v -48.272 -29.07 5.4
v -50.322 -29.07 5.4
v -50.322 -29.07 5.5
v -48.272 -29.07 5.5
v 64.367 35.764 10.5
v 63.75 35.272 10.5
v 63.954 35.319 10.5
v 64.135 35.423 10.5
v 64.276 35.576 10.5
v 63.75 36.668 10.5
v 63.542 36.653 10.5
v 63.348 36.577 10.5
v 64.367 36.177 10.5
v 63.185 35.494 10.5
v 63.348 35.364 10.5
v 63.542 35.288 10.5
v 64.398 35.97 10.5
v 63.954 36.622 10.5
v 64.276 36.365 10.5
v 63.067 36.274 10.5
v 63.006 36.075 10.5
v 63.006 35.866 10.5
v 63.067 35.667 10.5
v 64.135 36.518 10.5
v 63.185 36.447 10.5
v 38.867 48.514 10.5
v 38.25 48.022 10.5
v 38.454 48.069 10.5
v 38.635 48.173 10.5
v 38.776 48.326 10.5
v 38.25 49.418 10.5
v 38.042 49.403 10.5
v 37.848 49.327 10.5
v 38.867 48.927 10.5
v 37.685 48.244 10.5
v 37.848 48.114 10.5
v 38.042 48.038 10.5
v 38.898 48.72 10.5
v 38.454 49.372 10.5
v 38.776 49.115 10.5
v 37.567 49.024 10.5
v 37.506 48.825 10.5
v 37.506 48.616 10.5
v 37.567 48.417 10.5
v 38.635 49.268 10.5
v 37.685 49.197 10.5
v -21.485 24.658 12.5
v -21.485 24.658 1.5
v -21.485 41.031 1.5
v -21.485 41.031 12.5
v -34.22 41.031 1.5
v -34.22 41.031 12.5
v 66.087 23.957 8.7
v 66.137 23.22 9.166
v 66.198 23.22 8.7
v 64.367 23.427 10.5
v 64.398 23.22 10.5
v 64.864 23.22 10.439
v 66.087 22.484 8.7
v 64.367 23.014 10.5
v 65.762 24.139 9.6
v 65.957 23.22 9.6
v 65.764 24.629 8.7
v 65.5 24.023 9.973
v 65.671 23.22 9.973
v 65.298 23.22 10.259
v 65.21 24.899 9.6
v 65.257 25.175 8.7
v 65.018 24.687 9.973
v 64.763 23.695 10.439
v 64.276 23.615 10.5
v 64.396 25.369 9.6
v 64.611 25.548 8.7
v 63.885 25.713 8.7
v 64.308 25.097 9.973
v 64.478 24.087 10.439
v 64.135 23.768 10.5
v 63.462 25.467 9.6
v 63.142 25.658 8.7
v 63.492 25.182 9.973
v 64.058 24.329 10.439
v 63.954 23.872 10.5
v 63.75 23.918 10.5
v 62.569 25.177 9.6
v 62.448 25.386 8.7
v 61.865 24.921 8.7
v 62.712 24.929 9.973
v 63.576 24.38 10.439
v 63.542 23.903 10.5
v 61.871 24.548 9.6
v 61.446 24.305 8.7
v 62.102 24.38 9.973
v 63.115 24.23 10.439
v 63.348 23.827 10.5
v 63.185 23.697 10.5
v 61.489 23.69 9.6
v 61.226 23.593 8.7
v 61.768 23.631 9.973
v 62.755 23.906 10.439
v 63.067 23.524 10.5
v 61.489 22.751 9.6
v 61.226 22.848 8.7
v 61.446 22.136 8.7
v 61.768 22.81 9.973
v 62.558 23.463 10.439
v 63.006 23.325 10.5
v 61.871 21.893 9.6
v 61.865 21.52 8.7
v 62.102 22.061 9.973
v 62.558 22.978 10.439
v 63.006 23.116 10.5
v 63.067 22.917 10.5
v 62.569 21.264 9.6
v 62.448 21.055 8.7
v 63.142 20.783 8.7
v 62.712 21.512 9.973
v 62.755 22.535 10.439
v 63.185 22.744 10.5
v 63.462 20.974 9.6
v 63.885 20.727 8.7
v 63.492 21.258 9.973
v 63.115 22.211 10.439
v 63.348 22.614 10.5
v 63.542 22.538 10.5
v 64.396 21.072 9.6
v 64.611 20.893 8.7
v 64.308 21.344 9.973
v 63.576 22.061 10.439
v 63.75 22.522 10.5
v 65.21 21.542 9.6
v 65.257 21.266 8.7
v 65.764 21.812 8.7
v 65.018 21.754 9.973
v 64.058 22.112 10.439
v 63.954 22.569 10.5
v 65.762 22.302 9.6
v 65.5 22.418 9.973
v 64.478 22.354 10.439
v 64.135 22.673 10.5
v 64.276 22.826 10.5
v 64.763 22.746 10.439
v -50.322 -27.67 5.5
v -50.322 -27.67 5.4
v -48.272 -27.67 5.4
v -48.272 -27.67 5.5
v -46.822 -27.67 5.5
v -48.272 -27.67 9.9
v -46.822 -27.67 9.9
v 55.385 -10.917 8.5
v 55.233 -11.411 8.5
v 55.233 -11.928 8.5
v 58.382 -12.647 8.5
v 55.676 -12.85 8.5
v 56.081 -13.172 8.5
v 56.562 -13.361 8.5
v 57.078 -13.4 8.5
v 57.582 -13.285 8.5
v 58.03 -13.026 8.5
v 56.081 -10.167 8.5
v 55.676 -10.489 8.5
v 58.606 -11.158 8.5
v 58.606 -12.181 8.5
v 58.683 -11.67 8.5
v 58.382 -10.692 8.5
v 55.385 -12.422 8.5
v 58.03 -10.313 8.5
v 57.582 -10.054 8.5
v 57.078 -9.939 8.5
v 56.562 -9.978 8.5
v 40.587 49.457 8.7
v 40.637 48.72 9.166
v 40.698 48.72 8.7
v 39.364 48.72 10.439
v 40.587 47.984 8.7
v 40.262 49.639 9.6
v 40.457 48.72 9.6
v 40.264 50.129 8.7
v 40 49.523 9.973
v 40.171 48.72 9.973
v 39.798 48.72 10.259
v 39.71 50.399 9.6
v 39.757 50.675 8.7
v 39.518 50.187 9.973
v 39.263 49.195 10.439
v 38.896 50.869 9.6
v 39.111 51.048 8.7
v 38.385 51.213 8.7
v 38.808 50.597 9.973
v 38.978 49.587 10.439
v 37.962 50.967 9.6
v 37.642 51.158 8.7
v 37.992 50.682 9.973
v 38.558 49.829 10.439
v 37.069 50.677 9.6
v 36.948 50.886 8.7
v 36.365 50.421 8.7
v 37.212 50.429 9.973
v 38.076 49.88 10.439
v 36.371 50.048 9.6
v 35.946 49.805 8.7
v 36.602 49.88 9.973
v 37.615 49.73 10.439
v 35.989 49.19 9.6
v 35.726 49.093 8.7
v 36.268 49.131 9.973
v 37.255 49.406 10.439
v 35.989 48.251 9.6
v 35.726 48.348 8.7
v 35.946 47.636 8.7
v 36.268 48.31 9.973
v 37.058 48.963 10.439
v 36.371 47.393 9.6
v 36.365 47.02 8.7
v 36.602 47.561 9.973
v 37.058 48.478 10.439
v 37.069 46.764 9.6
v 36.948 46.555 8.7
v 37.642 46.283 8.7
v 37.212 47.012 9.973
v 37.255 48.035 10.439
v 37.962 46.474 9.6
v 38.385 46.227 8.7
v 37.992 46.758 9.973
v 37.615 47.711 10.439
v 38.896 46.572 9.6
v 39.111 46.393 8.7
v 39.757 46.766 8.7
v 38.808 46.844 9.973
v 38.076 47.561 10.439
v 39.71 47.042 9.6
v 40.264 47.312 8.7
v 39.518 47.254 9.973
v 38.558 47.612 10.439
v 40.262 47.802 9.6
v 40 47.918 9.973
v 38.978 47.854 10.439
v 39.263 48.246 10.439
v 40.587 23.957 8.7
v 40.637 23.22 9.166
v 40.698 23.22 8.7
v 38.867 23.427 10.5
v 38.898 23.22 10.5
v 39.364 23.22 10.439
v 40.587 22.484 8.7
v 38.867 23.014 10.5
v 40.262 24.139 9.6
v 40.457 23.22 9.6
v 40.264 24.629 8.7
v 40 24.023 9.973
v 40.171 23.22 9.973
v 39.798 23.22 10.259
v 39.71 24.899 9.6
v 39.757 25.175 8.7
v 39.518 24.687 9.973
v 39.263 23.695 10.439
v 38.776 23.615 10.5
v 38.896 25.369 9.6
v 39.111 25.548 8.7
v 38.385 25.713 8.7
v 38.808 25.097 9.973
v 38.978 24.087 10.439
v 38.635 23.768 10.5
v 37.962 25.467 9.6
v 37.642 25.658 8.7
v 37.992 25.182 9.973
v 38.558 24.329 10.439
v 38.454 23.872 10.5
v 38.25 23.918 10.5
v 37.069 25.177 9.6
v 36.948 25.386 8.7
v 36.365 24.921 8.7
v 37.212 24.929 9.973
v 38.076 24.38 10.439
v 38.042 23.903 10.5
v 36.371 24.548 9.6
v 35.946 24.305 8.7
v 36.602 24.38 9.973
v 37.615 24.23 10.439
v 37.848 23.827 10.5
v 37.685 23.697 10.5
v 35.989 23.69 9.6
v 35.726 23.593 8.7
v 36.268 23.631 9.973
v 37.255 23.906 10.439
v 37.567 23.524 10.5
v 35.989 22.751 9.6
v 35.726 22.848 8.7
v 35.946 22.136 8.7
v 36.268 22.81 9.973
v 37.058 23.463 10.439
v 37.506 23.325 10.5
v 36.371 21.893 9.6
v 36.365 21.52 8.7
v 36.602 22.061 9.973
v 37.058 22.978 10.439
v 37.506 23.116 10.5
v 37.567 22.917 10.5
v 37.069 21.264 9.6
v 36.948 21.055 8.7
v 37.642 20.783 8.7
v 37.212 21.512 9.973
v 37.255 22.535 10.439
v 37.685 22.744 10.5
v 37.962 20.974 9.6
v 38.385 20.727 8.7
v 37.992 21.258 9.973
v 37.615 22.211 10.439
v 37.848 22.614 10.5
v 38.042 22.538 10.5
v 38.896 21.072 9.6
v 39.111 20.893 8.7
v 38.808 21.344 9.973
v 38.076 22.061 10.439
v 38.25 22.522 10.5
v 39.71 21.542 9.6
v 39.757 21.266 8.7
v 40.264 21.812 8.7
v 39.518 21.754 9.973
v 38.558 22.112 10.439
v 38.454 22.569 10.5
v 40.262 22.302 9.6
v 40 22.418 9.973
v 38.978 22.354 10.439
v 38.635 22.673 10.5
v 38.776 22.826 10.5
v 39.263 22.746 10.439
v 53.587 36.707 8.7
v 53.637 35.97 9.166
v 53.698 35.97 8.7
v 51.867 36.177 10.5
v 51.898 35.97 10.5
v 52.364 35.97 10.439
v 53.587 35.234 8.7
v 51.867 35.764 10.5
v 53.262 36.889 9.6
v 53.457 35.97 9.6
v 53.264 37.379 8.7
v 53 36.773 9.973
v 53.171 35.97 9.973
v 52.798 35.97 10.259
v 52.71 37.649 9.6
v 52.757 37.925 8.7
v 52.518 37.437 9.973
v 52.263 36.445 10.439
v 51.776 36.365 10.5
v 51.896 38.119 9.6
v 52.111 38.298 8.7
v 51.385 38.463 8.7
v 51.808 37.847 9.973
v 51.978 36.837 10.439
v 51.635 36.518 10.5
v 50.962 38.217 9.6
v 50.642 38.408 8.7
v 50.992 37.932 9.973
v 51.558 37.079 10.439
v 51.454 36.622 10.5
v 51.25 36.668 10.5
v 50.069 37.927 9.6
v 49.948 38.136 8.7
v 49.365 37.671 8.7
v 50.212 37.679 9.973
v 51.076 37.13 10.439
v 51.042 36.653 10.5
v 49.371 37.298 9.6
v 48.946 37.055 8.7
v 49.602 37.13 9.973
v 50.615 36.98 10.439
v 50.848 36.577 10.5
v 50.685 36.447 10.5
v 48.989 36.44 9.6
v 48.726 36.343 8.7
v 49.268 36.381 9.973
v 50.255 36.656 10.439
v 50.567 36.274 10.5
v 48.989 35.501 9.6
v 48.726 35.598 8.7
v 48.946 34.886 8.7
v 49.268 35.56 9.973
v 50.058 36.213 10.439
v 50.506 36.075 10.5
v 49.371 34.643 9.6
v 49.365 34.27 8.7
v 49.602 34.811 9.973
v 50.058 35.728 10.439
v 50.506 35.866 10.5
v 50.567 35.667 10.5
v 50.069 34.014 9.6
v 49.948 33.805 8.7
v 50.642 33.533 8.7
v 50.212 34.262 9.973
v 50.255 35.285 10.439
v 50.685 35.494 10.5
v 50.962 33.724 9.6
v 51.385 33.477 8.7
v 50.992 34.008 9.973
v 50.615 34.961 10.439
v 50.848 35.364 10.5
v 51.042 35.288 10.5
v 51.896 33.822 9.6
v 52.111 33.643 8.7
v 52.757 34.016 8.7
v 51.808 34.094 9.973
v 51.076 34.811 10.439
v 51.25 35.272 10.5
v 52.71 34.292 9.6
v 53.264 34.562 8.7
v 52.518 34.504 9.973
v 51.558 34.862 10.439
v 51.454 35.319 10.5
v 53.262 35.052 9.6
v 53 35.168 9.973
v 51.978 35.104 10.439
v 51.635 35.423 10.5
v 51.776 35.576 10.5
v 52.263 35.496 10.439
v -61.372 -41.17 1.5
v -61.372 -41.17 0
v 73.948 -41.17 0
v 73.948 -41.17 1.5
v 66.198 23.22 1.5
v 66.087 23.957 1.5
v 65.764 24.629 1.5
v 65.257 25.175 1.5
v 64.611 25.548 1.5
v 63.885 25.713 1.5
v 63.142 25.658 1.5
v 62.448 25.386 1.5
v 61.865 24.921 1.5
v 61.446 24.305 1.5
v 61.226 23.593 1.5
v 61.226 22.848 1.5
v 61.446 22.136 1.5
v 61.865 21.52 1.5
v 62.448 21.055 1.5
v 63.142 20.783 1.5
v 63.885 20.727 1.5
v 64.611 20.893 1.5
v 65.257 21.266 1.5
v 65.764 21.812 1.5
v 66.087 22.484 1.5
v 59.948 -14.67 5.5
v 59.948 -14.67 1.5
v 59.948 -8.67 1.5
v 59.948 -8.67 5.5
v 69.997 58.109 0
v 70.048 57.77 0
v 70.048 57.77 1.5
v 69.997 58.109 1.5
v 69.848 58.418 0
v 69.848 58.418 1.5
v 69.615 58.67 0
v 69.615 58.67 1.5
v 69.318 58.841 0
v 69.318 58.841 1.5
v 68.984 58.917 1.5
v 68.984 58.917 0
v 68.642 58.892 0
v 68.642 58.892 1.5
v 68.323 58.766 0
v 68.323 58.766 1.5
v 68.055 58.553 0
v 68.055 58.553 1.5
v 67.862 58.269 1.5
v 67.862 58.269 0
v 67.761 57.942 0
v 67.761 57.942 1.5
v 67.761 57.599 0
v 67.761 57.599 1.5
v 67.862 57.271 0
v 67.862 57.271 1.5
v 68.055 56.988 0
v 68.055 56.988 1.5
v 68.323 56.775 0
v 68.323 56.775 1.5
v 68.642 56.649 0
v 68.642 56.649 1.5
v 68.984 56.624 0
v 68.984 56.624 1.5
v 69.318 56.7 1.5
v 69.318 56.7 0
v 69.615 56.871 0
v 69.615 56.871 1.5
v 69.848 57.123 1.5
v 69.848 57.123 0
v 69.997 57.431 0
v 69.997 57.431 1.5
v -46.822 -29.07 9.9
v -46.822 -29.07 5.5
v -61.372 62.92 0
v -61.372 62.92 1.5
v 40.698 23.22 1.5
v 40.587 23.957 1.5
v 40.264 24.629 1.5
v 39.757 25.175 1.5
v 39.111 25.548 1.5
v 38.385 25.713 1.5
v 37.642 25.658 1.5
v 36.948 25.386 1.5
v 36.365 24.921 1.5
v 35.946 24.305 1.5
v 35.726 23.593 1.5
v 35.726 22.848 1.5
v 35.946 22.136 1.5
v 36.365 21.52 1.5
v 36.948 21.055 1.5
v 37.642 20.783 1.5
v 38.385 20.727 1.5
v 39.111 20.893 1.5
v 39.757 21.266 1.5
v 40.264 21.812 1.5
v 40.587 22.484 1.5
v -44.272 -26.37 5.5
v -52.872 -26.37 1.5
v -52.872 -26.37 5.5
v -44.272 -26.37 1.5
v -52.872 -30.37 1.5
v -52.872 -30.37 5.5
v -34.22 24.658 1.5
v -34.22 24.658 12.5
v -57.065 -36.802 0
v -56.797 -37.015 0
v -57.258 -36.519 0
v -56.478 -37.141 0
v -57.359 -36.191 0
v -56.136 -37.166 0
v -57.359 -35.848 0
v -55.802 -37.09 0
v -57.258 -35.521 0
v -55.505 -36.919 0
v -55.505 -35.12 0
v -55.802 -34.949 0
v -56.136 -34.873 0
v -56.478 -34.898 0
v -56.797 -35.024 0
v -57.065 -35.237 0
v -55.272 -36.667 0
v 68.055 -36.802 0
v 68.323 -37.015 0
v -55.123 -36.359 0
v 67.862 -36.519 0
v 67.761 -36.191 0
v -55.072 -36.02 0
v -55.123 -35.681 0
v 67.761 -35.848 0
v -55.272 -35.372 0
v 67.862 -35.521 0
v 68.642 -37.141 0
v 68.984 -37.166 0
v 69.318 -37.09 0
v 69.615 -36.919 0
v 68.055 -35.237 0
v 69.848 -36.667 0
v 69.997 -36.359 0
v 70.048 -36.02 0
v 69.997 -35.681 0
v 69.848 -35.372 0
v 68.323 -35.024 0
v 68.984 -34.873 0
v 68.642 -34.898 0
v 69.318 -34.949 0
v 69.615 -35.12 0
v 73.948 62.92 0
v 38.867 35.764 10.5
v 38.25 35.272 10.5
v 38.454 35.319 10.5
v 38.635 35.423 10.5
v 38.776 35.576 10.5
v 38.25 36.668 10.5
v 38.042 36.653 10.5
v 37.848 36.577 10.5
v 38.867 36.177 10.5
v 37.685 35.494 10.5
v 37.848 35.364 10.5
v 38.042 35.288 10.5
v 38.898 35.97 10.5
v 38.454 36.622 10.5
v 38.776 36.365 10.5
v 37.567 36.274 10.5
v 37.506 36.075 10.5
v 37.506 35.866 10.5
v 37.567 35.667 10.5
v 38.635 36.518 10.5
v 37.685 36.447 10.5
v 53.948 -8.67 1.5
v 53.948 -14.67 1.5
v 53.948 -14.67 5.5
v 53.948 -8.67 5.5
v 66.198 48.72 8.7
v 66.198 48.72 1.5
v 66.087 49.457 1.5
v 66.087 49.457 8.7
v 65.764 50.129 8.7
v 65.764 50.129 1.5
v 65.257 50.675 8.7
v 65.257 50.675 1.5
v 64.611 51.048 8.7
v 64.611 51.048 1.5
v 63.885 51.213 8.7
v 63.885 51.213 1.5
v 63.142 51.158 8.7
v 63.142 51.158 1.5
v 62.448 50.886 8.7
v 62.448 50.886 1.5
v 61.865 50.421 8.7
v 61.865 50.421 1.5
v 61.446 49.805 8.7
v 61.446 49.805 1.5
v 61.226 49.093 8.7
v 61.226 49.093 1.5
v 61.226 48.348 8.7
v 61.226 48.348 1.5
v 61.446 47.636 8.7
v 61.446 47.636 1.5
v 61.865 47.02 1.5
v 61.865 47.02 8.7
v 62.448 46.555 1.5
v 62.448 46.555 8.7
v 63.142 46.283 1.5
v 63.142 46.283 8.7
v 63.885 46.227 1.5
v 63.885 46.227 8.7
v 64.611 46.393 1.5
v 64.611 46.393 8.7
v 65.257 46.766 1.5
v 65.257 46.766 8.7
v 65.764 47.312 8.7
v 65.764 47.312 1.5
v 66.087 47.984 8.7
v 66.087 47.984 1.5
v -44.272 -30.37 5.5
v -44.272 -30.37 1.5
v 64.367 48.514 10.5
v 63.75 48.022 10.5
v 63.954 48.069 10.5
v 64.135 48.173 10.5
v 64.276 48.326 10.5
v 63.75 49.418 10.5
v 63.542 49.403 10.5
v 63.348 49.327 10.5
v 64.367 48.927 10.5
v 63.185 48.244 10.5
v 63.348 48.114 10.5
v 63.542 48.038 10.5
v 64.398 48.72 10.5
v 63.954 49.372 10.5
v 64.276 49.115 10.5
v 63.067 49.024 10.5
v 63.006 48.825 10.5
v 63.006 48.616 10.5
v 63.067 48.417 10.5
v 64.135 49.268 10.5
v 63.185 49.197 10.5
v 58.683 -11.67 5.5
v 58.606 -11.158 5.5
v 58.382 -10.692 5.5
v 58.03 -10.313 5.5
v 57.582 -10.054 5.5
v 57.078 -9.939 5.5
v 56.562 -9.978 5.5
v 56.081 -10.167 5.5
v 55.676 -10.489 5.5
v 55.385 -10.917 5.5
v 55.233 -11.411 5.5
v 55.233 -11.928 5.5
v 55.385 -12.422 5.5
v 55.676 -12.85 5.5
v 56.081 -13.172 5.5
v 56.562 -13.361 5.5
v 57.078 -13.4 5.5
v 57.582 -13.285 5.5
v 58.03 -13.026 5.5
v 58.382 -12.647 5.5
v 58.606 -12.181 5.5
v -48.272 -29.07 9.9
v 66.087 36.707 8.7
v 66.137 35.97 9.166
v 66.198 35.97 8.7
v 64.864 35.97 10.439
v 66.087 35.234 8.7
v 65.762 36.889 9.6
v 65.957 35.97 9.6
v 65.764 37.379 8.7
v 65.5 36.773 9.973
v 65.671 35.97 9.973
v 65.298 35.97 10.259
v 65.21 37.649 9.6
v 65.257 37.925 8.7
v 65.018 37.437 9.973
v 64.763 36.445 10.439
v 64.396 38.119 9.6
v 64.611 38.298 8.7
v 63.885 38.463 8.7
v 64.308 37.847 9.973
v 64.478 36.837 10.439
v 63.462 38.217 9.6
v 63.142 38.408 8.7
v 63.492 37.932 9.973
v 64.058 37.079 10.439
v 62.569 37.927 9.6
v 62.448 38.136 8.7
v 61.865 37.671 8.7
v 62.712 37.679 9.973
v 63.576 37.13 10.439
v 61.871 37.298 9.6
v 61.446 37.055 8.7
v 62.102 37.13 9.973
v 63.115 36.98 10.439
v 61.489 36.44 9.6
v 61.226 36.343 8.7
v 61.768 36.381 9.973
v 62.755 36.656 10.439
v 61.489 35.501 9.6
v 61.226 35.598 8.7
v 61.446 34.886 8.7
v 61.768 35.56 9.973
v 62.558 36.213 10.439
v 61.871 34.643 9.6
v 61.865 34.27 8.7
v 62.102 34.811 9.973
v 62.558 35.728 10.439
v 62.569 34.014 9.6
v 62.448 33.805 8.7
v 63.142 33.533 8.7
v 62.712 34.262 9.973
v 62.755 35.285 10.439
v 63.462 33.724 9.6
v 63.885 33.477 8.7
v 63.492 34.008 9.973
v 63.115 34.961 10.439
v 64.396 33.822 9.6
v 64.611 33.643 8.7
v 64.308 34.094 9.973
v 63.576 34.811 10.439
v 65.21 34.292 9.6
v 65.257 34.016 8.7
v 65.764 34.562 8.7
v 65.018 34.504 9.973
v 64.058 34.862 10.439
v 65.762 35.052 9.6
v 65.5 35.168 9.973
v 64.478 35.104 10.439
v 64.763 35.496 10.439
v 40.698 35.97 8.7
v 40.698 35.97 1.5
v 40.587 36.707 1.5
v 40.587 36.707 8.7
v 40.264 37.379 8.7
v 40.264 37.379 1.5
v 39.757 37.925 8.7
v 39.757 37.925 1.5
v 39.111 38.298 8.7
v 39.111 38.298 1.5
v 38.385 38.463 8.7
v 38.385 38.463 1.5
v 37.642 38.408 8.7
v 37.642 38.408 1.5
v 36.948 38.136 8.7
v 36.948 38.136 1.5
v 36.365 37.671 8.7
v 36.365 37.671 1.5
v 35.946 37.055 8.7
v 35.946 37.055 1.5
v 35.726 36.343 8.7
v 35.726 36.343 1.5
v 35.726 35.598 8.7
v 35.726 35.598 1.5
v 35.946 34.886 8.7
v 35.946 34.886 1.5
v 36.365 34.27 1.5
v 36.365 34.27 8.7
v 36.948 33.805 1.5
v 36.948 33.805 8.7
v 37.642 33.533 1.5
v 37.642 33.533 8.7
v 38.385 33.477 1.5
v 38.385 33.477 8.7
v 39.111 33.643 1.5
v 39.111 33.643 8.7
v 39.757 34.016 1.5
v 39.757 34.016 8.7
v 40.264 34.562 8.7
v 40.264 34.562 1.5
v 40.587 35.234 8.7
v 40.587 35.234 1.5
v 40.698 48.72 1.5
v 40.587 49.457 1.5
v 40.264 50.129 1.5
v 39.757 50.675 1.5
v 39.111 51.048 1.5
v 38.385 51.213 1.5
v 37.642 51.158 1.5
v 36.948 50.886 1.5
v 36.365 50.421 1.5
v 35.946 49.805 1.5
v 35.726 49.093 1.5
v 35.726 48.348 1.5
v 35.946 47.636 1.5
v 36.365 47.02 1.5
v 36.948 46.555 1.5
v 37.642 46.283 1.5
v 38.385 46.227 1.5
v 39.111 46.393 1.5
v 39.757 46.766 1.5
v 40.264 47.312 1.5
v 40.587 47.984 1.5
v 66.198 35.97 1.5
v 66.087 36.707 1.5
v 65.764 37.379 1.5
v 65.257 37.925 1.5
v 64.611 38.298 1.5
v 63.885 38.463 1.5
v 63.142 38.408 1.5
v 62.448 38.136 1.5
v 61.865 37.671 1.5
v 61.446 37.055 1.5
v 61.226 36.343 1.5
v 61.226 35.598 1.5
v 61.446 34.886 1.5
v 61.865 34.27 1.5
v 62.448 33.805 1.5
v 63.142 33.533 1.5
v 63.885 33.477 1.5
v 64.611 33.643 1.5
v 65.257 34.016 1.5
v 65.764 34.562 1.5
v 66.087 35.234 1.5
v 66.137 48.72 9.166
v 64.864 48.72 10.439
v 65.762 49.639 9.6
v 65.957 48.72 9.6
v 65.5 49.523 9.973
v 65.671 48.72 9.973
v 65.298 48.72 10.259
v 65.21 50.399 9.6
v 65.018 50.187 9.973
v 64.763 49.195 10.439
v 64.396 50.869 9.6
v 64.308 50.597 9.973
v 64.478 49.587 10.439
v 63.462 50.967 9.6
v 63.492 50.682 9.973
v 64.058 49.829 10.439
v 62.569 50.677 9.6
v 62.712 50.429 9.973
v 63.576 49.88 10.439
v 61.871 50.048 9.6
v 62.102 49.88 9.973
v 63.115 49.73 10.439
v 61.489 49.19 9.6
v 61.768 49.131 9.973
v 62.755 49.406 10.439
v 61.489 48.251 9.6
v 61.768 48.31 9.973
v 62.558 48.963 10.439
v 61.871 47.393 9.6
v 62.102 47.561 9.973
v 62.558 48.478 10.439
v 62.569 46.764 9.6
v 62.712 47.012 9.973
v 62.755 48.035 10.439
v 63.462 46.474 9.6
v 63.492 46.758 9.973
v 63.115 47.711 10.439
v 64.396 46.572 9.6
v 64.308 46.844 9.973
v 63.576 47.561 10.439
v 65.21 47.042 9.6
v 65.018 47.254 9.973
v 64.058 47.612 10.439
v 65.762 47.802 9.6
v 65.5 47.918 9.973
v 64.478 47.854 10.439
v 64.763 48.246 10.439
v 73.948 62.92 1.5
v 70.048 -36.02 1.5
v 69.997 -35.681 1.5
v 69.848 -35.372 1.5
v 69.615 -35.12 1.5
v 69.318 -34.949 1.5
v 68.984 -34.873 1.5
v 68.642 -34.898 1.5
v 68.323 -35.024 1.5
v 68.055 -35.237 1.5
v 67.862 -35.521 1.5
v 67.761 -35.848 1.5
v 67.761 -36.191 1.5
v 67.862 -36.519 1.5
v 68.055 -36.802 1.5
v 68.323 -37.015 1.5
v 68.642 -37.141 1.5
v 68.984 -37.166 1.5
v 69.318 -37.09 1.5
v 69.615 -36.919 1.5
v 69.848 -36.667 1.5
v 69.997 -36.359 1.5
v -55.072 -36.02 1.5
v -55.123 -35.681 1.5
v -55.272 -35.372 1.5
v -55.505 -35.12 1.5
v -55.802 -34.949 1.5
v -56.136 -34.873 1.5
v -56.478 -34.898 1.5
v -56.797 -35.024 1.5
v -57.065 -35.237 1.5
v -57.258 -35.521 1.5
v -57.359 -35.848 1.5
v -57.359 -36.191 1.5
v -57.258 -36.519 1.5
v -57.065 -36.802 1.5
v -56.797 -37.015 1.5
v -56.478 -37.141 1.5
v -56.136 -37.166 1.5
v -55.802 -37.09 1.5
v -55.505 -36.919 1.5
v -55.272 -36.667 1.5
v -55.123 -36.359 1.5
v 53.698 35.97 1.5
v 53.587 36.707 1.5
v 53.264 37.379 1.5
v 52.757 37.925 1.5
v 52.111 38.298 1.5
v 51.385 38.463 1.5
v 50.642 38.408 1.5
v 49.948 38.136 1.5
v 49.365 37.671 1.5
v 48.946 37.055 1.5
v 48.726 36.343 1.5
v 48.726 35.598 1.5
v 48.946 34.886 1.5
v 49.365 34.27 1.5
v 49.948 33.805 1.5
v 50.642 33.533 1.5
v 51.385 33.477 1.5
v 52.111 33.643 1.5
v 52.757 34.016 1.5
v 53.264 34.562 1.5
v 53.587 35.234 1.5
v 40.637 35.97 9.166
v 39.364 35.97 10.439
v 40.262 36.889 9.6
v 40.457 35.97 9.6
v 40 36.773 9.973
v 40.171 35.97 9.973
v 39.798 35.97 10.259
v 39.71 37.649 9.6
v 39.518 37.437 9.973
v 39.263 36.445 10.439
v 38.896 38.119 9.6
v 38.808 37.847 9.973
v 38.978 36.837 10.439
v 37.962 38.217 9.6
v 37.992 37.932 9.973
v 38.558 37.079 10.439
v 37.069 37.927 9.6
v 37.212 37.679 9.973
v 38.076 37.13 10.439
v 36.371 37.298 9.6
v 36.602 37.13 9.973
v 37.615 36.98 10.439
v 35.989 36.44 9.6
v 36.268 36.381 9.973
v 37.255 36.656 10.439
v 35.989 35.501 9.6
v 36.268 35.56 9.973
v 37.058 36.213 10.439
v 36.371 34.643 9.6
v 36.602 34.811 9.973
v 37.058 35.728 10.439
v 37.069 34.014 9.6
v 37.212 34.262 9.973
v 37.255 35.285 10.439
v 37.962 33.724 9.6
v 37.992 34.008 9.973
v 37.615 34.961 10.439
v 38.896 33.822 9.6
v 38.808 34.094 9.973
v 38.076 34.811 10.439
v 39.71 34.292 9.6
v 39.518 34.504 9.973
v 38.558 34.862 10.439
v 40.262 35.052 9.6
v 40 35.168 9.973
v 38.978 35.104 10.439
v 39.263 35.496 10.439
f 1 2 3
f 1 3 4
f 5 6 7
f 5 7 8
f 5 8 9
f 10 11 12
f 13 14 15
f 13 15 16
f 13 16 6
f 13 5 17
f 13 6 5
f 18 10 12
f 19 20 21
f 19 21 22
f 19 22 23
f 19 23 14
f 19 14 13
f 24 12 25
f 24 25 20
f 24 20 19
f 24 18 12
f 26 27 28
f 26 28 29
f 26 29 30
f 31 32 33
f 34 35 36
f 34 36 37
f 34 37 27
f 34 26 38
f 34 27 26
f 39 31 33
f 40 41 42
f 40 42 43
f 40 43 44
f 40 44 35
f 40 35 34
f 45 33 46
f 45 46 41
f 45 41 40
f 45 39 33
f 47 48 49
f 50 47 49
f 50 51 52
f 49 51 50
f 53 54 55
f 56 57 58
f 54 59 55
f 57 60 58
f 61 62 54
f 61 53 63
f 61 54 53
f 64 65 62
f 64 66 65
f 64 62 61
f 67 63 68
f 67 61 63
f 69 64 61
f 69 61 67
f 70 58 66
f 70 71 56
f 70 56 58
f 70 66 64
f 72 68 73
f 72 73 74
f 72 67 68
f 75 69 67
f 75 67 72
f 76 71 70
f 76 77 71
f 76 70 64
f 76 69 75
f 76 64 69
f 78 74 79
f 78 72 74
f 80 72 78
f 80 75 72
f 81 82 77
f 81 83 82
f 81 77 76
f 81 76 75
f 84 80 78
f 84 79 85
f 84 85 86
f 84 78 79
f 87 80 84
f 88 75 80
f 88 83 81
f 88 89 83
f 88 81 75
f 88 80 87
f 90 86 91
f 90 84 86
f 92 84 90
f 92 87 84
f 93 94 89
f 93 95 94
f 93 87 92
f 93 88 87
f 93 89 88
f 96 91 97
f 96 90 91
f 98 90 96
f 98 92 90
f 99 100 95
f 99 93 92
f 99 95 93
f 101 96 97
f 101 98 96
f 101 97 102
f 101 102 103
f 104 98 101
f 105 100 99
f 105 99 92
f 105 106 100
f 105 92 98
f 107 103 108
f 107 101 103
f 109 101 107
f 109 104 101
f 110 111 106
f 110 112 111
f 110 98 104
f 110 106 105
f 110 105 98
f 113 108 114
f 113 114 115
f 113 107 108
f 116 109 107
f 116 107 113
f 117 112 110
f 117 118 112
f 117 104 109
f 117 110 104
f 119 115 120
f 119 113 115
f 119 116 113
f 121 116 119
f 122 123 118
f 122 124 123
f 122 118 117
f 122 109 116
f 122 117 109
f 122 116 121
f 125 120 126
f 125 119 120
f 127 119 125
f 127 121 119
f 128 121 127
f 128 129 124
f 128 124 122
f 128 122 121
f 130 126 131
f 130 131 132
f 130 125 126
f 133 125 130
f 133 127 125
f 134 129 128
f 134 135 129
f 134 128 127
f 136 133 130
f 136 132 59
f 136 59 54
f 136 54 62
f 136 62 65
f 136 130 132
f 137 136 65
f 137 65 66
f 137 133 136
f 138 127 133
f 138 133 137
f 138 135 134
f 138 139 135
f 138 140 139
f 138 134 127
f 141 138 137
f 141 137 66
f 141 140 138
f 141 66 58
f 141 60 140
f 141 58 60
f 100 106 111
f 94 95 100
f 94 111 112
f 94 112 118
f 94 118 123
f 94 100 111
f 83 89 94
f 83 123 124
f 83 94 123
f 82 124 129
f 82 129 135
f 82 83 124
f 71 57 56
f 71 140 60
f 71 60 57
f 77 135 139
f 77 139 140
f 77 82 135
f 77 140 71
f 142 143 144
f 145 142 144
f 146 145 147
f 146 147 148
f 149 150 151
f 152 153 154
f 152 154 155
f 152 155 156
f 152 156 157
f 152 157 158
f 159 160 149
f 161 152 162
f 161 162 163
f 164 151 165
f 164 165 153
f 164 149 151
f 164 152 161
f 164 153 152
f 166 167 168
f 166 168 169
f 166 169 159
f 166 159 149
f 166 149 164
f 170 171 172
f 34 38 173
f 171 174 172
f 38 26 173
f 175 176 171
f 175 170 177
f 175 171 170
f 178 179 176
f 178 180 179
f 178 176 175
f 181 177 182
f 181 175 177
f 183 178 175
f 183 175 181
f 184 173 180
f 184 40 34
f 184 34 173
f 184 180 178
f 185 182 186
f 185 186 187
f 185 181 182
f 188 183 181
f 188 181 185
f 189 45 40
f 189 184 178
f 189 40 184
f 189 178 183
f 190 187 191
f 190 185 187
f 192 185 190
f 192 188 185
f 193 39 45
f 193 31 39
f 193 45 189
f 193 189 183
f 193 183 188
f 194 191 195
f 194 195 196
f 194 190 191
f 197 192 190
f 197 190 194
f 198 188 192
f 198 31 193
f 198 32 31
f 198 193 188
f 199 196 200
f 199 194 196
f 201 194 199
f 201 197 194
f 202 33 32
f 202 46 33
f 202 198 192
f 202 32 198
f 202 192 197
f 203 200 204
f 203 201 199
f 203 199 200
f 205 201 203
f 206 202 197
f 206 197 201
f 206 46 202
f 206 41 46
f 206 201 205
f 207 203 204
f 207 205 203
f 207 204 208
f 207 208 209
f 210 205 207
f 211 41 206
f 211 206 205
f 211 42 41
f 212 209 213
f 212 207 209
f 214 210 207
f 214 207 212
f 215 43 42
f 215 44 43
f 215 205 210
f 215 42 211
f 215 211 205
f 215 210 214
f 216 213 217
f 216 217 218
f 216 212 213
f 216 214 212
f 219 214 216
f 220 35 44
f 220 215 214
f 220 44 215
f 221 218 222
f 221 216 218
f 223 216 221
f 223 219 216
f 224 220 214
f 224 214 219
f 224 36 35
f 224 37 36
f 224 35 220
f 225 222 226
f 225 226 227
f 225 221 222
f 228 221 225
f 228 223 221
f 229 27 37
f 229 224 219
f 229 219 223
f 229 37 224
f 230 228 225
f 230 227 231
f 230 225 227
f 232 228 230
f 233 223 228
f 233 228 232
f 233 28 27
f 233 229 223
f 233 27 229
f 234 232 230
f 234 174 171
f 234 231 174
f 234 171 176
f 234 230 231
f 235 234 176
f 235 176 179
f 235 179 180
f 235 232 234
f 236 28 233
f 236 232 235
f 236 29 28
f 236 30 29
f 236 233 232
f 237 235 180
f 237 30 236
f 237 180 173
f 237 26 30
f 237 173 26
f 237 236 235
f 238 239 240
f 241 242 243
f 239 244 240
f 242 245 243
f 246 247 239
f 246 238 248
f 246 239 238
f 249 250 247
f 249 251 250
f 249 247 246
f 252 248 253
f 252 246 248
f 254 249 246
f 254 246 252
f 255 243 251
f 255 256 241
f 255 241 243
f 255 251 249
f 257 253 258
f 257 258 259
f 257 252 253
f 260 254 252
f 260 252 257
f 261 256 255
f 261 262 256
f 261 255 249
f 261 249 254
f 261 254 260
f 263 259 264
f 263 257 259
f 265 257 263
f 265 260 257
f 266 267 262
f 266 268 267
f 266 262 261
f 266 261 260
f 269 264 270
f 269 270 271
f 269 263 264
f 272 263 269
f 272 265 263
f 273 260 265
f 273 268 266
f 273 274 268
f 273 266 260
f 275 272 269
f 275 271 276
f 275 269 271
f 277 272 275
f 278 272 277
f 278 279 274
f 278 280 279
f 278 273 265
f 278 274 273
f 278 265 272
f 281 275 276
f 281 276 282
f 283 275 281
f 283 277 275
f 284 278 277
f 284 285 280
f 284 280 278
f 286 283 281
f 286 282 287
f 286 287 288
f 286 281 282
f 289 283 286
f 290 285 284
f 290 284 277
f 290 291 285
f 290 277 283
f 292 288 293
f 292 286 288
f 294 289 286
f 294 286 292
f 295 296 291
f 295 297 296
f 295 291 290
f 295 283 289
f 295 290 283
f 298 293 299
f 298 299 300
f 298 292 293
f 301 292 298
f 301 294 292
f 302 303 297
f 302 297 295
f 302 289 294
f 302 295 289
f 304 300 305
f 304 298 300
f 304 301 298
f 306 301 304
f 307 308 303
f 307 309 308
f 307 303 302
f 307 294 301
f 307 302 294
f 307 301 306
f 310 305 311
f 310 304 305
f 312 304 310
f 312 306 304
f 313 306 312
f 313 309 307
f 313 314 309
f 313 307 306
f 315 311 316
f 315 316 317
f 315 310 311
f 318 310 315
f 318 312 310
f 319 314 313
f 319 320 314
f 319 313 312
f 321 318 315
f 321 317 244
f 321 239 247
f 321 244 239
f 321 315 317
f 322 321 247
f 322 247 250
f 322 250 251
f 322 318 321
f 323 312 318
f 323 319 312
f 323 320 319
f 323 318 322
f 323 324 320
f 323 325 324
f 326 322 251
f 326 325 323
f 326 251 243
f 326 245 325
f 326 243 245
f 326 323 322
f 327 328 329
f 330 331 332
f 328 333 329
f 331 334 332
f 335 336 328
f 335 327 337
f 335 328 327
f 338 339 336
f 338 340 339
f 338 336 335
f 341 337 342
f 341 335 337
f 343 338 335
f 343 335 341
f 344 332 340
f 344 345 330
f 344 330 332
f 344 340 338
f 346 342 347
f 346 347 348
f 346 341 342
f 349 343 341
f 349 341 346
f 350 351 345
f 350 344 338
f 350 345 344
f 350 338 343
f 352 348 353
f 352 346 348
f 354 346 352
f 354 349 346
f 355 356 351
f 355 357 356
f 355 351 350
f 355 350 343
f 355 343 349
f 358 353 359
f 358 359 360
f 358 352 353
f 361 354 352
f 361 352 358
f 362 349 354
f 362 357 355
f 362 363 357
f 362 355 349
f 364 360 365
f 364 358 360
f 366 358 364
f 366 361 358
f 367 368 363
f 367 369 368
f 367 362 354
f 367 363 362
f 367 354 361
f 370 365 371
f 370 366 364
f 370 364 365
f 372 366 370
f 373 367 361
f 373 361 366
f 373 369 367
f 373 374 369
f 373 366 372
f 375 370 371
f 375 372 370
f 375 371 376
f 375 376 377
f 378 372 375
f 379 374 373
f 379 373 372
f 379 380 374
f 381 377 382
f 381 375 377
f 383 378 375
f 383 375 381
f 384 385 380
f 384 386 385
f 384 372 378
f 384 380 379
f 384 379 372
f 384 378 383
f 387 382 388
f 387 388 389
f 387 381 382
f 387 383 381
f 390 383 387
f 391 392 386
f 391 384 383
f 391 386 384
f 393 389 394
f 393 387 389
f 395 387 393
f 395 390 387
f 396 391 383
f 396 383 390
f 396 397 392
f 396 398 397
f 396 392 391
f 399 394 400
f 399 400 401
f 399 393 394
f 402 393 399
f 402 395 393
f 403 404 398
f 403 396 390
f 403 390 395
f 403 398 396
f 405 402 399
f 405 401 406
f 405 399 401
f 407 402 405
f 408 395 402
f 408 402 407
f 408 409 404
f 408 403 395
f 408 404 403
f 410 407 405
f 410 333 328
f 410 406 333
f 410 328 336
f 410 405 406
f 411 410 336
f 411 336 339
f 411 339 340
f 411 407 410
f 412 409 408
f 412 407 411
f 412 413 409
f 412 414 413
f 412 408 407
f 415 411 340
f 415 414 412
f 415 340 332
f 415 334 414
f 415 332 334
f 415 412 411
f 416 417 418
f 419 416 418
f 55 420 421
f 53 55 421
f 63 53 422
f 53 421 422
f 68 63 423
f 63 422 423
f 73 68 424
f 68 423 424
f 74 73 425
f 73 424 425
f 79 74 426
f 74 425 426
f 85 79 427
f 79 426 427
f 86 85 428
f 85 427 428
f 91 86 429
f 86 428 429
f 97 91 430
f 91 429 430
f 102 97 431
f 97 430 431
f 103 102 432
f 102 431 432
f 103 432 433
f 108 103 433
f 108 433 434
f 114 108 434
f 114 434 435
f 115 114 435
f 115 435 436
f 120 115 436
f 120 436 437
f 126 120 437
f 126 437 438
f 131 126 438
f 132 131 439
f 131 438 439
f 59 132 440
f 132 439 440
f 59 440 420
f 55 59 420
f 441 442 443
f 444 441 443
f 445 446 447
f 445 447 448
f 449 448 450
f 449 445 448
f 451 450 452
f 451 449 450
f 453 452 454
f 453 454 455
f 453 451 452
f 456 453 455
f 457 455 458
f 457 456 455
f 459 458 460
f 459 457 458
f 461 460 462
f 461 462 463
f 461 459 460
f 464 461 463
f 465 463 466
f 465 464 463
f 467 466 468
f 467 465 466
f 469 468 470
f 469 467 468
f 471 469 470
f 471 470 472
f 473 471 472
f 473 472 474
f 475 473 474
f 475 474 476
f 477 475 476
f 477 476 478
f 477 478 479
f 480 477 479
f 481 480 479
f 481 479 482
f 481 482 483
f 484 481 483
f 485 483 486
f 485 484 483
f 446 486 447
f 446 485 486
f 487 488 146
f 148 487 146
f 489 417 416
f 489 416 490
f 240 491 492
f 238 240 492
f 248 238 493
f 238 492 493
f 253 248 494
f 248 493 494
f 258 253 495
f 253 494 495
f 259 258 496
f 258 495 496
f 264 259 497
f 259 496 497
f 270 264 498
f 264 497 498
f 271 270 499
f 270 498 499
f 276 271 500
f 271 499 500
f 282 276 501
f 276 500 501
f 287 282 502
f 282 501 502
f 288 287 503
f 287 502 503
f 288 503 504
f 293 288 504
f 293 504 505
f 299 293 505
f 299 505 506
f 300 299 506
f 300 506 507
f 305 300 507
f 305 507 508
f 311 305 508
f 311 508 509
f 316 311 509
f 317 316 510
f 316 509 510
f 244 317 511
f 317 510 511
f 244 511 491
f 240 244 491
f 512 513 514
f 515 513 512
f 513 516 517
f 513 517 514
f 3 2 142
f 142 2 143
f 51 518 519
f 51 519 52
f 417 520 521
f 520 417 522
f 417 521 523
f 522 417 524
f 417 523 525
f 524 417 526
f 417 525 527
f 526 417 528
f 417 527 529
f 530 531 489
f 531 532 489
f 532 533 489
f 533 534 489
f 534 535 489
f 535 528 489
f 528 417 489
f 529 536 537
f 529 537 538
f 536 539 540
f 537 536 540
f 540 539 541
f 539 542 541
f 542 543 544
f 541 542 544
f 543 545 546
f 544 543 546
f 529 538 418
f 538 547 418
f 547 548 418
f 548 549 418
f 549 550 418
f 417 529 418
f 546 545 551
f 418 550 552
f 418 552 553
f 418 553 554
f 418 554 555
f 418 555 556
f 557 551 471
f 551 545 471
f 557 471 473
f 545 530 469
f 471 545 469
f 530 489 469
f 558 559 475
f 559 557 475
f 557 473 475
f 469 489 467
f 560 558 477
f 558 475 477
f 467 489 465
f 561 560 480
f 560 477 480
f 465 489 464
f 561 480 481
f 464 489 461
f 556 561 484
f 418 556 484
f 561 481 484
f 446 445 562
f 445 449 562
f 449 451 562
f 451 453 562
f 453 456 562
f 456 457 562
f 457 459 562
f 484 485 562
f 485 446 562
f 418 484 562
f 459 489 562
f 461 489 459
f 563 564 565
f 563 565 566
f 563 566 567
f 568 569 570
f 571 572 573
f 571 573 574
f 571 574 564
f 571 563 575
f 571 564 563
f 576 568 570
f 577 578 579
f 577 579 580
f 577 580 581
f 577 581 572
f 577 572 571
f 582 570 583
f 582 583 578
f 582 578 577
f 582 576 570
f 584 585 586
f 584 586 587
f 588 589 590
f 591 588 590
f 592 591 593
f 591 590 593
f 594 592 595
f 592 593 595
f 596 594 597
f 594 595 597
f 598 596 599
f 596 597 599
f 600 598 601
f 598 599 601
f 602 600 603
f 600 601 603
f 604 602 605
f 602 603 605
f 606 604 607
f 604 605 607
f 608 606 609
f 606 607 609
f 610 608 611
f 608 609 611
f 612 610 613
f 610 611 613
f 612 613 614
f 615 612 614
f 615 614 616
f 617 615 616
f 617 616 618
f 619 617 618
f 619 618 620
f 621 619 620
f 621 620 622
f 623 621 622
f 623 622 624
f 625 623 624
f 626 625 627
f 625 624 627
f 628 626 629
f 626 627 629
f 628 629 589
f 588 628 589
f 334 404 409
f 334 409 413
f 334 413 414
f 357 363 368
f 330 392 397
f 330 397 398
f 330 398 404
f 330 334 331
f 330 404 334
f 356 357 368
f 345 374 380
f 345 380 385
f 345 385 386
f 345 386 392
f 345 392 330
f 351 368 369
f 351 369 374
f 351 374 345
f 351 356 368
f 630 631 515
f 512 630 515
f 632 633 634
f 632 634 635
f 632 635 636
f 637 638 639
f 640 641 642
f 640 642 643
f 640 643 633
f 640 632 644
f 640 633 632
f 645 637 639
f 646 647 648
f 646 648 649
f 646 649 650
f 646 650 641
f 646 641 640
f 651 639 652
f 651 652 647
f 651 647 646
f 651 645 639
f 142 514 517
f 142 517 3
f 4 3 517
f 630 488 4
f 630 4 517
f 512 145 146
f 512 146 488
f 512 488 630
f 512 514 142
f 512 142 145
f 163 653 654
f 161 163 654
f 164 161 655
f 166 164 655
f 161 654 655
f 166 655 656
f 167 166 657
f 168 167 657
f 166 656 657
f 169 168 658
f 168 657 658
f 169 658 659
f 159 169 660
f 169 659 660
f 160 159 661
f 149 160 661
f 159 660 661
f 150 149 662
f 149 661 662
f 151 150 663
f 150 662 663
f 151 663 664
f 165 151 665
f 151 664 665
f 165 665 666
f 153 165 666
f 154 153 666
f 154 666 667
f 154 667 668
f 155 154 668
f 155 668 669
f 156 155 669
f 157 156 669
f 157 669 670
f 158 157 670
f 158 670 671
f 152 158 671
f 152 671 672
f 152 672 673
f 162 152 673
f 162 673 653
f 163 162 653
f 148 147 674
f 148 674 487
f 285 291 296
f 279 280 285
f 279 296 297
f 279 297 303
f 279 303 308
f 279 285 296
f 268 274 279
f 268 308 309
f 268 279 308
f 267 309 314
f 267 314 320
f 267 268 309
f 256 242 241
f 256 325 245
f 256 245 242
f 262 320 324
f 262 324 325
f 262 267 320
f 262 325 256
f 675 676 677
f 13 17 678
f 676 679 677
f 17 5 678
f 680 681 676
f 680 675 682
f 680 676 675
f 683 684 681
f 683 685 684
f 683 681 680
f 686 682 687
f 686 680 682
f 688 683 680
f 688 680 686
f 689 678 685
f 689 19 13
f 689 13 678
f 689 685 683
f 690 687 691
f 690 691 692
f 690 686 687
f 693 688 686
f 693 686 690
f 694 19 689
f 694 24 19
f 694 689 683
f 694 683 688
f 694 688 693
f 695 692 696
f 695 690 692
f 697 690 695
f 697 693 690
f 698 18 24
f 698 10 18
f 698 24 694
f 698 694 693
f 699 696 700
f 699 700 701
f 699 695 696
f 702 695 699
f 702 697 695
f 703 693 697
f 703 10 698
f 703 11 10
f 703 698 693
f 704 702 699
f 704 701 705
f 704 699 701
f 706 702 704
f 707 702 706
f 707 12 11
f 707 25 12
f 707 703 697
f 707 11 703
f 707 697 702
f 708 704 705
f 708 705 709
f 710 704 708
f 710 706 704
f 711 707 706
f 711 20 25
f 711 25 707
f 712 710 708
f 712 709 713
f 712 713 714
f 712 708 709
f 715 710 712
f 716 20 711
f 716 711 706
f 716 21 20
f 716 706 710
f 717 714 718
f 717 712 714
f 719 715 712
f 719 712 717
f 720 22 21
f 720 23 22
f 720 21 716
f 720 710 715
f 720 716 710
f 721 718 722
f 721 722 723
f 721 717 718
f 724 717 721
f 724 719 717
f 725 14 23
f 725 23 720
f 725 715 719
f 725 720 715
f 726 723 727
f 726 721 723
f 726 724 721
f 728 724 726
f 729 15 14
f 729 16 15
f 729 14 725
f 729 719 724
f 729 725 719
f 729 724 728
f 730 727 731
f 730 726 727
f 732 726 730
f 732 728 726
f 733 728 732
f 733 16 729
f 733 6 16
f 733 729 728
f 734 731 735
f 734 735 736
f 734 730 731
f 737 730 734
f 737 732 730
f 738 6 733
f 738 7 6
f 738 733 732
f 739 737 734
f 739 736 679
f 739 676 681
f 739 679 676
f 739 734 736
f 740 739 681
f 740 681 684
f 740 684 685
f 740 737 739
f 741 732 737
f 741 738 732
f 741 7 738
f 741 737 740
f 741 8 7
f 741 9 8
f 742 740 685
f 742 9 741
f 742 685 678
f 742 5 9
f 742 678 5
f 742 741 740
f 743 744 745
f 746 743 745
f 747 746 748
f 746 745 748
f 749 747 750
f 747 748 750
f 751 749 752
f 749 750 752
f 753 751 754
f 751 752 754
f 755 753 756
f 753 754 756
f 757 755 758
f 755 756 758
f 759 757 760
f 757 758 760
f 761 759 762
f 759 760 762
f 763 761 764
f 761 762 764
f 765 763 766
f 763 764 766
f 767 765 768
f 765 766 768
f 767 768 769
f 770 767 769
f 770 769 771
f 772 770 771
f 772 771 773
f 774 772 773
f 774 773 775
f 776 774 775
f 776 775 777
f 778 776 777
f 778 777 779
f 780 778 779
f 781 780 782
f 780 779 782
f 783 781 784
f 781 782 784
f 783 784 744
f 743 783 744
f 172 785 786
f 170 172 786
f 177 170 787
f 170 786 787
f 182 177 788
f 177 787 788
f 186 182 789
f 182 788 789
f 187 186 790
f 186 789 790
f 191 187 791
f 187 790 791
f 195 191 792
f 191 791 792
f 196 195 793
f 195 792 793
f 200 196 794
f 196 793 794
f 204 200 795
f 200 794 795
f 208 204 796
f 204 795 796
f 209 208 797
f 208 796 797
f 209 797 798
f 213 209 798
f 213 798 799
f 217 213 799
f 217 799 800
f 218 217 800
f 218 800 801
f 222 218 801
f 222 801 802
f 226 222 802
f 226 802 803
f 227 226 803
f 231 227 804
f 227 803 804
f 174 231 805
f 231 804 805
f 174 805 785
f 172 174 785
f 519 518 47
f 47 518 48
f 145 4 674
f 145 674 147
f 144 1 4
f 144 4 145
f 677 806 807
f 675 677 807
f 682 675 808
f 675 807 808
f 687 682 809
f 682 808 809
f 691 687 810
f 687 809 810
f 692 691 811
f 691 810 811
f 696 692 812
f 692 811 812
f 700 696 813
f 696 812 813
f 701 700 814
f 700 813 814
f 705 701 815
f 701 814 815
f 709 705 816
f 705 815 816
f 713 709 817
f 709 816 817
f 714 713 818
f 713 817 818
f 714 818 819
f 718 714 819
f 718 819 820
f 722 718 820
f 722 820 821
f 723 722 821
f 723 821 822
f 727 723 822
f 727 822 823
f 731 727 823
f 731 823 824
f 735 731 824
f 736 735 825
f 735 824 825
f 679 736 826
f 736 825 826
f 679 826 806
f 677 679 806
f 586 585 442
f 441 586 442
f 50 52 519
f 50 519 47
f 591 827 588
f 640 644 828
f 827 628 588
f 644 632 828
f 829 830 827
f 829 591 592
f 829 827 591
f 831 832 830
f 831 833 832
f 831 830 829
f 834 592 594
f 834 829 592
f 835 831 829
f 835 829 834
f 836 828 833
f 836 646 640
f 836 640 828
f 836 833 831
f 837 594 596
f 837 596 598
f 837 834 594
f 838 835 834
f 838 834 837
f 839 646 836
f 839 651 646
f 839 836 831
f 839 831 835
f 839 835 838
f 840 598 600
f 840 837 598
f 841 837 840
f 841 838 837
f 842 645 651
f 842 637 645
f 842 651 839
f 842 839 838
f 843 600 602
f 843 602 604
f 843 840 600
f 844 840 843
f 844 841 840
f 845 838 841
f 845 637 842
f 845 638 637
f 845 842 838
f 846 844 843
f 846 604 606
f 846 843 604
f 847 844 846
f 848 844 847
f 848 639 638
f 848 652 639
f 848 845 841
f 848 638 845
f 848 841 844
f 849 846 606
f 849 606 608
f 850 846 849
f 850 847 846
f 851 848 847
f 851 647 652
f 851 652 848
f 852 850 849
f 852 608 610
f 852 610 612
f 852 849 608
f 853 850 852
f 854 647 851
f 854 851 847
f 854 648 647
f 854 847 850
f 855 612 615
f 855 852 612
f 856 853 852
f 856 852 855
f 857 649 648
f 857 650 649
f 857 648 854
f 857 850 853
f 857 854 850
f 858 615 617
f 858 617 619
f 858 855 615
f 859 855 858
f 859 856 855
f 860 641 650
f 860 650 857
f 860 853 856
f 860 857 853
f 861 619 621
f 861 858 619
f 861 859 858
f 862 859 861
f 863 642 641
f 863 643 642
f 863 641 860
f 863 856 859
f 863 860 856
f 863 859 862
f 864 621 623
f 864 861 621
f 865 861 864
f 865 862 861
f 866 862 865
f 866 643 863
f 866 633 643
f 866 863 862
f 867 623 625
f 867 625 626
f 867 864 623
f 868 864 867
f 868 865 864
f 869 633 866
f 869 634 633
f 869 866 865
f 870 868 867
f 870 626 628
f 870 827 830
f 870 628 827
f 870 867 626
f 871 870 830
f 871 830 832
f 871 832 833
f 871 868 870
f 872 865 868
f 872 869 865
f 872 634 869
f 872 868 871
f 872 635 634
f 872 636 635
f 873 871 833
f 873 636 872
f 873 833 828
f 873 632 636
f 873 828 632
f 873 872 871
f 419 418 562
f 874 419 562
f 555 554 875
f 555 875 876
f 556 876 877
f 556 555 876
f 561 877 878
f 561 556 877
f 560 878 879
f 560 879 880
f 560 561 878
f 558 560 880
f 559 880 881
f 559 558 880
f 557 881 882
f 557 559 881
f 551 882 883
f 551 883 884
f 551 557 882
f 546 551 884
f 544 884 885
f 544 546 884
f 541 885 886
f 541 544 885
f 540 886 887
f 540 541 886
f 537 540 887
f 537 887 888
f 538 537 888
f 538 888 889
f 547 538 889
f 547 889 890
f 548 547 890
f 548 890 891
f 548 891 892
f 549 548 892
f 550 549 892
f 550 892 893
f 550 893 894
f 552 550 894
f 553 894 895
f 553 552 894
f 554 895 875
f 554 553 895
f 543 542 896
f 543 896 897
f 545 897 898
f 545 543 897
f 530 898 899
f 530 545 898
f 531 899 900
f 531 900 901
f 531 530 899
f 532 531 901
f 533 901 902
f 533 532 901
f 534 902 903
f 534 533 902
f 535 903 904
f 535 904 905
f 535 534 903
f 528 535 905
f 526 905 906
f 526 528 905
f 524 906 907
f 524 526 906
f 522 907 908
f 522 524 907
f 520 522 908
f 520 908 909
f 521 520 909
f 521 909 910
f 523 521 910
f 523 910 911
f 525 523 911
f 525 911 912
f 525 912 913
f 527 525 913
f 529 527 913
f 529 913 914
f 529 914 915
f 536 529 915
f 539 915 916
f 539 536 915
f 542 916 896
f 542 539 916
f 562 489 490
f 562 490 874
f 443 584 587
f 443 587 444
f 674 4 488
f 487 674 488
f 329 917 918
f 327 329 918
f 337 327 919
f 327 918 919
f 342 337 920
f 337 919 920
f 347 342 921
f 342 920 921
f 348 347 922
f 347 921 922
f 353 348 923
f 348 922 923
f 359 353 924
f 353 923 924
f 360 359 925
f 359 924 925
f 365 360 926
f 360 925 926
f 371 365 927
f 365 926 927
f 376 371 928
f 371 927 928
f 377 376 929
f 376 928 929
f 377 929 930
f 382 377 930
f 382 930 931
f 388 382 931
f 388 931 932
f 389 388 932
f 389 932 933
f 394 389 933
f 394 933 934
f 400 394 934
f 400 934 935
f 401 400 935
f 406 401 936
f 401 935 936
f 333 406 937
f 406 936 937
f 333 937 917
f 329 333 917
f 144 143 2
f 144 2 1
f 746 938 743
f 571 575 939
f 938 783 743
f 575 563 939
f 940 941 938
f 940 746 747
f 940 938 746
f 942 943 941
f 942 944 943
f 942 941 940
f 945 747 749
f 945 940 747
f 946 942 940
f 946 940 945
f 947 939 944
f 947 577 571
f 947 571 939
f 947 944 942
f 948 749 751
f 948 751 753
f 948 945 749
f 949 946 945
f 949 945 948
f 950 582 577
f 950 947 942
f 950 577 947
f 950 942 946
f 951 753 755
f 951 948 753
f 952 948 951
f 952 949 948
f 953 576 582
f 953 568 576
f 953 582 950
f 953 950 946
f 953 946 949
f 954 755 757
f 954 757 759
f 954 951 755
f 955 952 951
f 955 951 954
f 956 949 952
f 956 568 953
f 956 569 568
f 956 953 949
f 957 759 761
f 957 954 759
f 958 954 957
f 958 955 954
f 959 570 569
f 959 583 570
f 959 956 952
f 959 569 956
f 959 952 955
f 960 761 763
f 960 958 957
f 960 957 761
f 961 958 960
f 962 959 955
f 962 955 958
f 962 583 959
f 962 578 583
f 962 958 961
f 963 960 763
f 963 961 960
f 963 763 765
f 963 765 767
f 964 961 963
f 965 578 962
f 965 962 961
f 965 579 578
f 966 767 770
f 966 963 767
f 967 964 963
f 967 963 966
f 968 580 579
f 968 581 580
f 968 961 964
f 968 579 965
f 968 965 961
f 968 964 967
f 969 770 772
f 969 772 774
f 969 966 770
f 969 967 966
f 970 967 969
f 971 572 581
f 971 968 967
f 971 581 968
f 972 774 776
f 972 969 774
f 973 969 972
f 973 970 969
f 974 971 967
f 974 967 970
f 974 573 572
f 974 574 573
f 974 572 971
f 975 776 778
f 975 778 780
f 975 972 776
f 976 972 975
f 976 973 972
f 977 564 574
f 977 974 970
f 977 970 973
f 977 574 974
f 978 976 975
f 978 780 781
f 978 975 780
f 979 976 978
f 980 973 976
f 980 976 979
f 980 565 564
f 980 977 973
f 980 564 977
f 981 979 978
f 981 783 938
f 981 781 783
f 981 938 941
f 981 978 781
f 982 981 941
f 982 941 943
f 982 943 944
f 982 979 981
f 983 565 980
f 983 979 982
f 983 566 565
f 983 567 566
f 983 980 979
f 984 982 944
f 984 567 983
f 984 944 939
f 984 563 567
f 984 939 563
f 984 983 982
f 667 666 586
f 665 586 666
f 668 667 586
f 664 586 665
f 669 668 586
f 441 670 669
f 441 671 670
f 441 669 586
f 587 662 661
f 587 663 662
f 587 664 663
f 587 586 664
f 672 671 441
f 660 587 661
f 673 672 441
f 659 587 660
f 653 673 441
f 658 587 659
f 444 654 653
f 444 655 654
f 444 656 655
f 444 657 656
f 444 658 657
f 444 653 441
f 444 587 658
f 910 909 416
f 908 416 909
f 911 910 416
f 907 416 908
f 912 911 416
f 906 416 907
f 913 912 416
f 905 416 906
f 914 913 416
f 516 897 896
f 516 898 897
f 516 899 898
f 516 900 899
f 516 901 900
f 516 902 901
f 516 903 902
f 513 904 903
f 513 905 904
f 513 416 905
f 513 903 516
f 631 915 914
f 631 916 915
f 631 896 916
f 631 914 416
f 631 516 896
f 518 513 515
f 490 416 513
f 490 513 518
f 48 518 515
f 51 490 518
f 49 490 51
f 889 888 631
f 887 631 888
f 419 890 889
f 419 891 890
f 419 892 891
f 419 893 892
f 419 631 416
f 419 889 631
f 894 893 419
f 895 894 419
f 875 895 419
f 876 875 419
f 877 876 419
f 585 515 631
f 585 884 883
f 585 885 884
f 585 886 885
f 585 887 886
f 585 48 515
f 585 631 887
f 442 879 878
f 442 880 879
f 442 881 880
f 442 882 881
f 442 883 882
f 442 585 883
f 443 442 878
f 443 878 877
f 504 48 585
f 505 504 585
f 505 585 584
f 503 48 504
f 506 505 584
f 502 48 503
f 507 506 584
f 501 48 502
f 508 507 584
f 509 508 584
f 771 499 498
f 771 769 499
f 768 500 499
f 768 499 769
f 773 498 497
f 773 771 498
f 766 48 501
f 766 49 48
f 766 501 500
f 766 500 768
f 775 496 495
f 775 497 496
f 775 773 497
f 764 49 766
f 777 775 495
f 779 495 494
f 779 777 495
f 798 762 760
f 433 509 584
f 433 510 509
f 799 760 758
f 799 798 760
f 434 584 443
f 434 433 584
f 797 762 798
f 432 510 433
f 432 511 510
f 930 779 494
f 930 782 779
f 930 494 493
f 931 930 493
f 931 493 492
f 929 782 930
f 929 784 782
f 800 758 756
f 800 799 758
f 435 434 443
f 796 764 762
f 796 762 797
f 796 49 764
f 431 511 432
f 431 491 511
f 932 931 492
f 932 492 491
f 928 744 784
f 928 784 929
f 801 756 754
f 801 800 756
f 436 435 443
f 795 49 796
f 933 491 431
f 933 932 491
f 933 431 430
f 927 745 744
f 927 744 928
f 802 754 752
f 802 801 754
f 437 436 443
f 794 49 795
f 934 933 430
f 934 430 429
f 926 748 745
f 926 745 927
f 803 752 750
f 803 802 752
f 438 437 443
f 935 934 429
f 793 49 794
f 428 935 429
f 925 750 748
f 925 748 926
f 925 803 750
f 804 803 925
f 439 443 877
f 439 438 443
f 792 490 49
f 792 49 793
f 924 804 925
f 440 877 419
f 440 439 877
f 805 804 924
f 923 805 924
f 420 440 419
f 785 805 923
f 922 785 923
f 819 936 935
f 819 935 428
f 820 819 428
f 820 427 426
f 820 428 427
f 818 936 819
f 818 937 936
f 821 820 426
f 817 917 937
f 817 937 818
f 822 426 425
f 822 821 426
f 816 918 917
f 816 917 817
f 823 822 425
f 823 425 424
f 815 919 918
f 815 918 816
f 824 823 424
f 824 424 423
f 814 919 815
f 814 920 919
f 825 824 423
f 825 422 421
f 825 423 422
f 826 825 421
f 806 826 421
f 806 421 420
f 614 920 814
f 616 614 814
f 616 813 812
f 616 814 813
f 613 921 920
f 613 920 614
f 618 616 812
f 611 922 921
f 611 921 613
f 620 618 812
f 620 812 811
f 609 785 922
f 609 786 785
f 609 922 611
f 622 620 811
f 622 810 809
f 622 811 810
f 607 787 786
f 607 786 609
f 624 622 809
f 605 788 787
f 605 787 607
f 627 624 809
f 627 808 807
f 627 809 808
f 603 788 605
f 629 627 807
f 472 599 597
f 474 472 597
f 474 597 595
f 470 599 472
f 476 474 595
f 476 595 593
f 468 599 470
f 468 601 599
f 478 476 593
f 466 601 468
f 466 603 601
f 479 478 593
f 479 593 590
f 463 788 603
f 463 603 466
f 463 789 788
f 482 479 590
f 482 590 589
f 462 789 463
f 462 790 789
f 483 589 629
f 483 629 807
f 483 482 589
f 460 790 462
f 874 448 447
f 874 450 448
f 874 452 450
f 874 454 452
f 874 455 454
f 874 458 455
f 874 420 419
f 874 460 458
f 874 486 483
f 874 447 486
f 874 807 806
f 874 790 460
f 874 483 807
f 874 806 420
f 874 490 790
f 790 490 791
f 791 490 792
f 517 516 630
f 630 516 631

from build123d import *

# Parameters (mm, degrees)
F0_W      = 135.32
F0_H      = 104.09
F0_R      = 1.15
F1_DEPTH  = 1.5
F2_W      = 8.6
F2_H      = 4
F2_W_2    = 3.5
F2_H_2    = 1.4
F3_DEPTH  = 4
F4_DEPTH  = 3.9
F5_W      = 1.45
F5_H      = 1.4
F6_DEPTH  = 4.5
F2_W_3    = 6
F2_H_3    = 6
F2_R      = 1.735
F7_DEPTH  = 4
F8_DEPTH  = 7
F2_R_2    = 2.5
F9_DEPTH  = 9
F10_R     = 1.8
F2_W_4    = 12.7346146769
F2_H_4    = 16.3730749178
F11_DEPTH = 11


with BuildPart() as f1:
    # F0 (on Top) → F1 (new body)
    with BuildSketch(Plane.XY):
        with Locations((6.288124553, 10.8754571187)):
            Rectangle(F0_W, F0_H)
        with Locations((-56.221875447, -36.0195428813)):
            Circle(F0_R, mode=Mode.SUBTRACT)
        with Locations((68.898124553, -36.0195428813)):
            Circle(F0_R, mode=Mode.SUBTRACT)
        with Locations((68.898124553, 57.7704571187)):
            Circle(F0_R, mode=Mode.SUBTRACT)
    extrude(amount=F1_DEPTH)

    # F2 (on face) → F3 (join)
    with BuildSketch(Plane.XY.offset(1.5)):
        with Locations((-48.571875447, -28.3695428813)):
            Rectangle(F2_W, F2_H)
        with Locations((-48.571875447, -28.3695428813)):
            Rectangle(F2_W_2, F2_H_2, mode=Mode.SUBTRACT)
    extrude(amount=F3_DEPTH)

    # F4 (add): a face of the model
    f4_faces = [f1.faces().sort_by_distance(p)[0] for p in [
        (-48.571875447, -28.3695428813, 1.5),
    ]]
    extrude(f4_faces, amount=F4_DEPTH)

    # F5 (on face) → F6 (join)
    with BuildSketch(Plane.XY.offset(5.4)):
        with Locations((-47.546875447, -28.3695428813)):
            Rectangle(F5_W, F5_H)
    extrude(amount=F6_DEPTH)

    # F2 (on face) → F7 (join)
    with BuildSketch(Plane.XY.offset(1.5)):
        with Locations((56.948124553, -11.6695428813)):
            Rectangle(F2_W_3, F2_H_3)
        with Locations((56.948124553, -11.6695428813)):
            Circle(F2_R, mode=Mode.SUBTRACT)
    extrude(amount=F7_DEPTH)

    # F2 (on face) → F8 (join)
    with BuildSketch(Plane.XY.offset(1.5)):
        with Locations((56.948124553, -11.6695428813)):
            Circle(F2_R)
    extrude(amount=F8_DEPTH)

    # F2 (on face) → F9 (join)
    with BuildSketch(Plane.XY.offset(1.5)):
        with Locations((38.198124553, 23.2204571187)):
            Circle(F2_R_2)
        with Locations((51.198124553, 35.9704571187)):
            Circle(F2_R_2)
        with Locations((63.698124553, 35.9704571187)):
            Circle(F2_R_2)
        with Locations((63.698124553, 23.2204571187)):
            Circle(F2_R_2)
        with Locations((38.198124553, 35.9704571187)):
            Circle(F2_R_2)
        with Locations((63.698124553, 48.7204571187)):
            Circle(F2_R_2)
        with Locations((38.198124553, 48.7204571187)):
            Circle(F2_R_2)
    extrude(amount=F9_DEPTH)

    # F10
    f10_edges = [f1.edges().sort_by_distance(p)[0] for p in [
        (35.698125, 23.220457, 10.5),
        (35.698125, 35.970457, 10.5),
        (48.698125, 35.970457, 10.5),
        (35.698125, 48.720457, 10.5),
        (61.198125, 35.970457, 10.5),
        (61.198125, 48.720457, 10.5),
        (61.198125, 23.220457, 10.5),
    ]]
    fillet(f10_edges, radius=F10_R)

    # F2 (on face) → F11 (join)
    with BuildSketch(Plane.XY.offset(1.5)):
        with Locations((-27.8526208236, 32.8443583531)):
            Rectangle(F2_W_4, F2_H_4)
    extrude(amount=F11_DEPTH)


solid = f1.part
